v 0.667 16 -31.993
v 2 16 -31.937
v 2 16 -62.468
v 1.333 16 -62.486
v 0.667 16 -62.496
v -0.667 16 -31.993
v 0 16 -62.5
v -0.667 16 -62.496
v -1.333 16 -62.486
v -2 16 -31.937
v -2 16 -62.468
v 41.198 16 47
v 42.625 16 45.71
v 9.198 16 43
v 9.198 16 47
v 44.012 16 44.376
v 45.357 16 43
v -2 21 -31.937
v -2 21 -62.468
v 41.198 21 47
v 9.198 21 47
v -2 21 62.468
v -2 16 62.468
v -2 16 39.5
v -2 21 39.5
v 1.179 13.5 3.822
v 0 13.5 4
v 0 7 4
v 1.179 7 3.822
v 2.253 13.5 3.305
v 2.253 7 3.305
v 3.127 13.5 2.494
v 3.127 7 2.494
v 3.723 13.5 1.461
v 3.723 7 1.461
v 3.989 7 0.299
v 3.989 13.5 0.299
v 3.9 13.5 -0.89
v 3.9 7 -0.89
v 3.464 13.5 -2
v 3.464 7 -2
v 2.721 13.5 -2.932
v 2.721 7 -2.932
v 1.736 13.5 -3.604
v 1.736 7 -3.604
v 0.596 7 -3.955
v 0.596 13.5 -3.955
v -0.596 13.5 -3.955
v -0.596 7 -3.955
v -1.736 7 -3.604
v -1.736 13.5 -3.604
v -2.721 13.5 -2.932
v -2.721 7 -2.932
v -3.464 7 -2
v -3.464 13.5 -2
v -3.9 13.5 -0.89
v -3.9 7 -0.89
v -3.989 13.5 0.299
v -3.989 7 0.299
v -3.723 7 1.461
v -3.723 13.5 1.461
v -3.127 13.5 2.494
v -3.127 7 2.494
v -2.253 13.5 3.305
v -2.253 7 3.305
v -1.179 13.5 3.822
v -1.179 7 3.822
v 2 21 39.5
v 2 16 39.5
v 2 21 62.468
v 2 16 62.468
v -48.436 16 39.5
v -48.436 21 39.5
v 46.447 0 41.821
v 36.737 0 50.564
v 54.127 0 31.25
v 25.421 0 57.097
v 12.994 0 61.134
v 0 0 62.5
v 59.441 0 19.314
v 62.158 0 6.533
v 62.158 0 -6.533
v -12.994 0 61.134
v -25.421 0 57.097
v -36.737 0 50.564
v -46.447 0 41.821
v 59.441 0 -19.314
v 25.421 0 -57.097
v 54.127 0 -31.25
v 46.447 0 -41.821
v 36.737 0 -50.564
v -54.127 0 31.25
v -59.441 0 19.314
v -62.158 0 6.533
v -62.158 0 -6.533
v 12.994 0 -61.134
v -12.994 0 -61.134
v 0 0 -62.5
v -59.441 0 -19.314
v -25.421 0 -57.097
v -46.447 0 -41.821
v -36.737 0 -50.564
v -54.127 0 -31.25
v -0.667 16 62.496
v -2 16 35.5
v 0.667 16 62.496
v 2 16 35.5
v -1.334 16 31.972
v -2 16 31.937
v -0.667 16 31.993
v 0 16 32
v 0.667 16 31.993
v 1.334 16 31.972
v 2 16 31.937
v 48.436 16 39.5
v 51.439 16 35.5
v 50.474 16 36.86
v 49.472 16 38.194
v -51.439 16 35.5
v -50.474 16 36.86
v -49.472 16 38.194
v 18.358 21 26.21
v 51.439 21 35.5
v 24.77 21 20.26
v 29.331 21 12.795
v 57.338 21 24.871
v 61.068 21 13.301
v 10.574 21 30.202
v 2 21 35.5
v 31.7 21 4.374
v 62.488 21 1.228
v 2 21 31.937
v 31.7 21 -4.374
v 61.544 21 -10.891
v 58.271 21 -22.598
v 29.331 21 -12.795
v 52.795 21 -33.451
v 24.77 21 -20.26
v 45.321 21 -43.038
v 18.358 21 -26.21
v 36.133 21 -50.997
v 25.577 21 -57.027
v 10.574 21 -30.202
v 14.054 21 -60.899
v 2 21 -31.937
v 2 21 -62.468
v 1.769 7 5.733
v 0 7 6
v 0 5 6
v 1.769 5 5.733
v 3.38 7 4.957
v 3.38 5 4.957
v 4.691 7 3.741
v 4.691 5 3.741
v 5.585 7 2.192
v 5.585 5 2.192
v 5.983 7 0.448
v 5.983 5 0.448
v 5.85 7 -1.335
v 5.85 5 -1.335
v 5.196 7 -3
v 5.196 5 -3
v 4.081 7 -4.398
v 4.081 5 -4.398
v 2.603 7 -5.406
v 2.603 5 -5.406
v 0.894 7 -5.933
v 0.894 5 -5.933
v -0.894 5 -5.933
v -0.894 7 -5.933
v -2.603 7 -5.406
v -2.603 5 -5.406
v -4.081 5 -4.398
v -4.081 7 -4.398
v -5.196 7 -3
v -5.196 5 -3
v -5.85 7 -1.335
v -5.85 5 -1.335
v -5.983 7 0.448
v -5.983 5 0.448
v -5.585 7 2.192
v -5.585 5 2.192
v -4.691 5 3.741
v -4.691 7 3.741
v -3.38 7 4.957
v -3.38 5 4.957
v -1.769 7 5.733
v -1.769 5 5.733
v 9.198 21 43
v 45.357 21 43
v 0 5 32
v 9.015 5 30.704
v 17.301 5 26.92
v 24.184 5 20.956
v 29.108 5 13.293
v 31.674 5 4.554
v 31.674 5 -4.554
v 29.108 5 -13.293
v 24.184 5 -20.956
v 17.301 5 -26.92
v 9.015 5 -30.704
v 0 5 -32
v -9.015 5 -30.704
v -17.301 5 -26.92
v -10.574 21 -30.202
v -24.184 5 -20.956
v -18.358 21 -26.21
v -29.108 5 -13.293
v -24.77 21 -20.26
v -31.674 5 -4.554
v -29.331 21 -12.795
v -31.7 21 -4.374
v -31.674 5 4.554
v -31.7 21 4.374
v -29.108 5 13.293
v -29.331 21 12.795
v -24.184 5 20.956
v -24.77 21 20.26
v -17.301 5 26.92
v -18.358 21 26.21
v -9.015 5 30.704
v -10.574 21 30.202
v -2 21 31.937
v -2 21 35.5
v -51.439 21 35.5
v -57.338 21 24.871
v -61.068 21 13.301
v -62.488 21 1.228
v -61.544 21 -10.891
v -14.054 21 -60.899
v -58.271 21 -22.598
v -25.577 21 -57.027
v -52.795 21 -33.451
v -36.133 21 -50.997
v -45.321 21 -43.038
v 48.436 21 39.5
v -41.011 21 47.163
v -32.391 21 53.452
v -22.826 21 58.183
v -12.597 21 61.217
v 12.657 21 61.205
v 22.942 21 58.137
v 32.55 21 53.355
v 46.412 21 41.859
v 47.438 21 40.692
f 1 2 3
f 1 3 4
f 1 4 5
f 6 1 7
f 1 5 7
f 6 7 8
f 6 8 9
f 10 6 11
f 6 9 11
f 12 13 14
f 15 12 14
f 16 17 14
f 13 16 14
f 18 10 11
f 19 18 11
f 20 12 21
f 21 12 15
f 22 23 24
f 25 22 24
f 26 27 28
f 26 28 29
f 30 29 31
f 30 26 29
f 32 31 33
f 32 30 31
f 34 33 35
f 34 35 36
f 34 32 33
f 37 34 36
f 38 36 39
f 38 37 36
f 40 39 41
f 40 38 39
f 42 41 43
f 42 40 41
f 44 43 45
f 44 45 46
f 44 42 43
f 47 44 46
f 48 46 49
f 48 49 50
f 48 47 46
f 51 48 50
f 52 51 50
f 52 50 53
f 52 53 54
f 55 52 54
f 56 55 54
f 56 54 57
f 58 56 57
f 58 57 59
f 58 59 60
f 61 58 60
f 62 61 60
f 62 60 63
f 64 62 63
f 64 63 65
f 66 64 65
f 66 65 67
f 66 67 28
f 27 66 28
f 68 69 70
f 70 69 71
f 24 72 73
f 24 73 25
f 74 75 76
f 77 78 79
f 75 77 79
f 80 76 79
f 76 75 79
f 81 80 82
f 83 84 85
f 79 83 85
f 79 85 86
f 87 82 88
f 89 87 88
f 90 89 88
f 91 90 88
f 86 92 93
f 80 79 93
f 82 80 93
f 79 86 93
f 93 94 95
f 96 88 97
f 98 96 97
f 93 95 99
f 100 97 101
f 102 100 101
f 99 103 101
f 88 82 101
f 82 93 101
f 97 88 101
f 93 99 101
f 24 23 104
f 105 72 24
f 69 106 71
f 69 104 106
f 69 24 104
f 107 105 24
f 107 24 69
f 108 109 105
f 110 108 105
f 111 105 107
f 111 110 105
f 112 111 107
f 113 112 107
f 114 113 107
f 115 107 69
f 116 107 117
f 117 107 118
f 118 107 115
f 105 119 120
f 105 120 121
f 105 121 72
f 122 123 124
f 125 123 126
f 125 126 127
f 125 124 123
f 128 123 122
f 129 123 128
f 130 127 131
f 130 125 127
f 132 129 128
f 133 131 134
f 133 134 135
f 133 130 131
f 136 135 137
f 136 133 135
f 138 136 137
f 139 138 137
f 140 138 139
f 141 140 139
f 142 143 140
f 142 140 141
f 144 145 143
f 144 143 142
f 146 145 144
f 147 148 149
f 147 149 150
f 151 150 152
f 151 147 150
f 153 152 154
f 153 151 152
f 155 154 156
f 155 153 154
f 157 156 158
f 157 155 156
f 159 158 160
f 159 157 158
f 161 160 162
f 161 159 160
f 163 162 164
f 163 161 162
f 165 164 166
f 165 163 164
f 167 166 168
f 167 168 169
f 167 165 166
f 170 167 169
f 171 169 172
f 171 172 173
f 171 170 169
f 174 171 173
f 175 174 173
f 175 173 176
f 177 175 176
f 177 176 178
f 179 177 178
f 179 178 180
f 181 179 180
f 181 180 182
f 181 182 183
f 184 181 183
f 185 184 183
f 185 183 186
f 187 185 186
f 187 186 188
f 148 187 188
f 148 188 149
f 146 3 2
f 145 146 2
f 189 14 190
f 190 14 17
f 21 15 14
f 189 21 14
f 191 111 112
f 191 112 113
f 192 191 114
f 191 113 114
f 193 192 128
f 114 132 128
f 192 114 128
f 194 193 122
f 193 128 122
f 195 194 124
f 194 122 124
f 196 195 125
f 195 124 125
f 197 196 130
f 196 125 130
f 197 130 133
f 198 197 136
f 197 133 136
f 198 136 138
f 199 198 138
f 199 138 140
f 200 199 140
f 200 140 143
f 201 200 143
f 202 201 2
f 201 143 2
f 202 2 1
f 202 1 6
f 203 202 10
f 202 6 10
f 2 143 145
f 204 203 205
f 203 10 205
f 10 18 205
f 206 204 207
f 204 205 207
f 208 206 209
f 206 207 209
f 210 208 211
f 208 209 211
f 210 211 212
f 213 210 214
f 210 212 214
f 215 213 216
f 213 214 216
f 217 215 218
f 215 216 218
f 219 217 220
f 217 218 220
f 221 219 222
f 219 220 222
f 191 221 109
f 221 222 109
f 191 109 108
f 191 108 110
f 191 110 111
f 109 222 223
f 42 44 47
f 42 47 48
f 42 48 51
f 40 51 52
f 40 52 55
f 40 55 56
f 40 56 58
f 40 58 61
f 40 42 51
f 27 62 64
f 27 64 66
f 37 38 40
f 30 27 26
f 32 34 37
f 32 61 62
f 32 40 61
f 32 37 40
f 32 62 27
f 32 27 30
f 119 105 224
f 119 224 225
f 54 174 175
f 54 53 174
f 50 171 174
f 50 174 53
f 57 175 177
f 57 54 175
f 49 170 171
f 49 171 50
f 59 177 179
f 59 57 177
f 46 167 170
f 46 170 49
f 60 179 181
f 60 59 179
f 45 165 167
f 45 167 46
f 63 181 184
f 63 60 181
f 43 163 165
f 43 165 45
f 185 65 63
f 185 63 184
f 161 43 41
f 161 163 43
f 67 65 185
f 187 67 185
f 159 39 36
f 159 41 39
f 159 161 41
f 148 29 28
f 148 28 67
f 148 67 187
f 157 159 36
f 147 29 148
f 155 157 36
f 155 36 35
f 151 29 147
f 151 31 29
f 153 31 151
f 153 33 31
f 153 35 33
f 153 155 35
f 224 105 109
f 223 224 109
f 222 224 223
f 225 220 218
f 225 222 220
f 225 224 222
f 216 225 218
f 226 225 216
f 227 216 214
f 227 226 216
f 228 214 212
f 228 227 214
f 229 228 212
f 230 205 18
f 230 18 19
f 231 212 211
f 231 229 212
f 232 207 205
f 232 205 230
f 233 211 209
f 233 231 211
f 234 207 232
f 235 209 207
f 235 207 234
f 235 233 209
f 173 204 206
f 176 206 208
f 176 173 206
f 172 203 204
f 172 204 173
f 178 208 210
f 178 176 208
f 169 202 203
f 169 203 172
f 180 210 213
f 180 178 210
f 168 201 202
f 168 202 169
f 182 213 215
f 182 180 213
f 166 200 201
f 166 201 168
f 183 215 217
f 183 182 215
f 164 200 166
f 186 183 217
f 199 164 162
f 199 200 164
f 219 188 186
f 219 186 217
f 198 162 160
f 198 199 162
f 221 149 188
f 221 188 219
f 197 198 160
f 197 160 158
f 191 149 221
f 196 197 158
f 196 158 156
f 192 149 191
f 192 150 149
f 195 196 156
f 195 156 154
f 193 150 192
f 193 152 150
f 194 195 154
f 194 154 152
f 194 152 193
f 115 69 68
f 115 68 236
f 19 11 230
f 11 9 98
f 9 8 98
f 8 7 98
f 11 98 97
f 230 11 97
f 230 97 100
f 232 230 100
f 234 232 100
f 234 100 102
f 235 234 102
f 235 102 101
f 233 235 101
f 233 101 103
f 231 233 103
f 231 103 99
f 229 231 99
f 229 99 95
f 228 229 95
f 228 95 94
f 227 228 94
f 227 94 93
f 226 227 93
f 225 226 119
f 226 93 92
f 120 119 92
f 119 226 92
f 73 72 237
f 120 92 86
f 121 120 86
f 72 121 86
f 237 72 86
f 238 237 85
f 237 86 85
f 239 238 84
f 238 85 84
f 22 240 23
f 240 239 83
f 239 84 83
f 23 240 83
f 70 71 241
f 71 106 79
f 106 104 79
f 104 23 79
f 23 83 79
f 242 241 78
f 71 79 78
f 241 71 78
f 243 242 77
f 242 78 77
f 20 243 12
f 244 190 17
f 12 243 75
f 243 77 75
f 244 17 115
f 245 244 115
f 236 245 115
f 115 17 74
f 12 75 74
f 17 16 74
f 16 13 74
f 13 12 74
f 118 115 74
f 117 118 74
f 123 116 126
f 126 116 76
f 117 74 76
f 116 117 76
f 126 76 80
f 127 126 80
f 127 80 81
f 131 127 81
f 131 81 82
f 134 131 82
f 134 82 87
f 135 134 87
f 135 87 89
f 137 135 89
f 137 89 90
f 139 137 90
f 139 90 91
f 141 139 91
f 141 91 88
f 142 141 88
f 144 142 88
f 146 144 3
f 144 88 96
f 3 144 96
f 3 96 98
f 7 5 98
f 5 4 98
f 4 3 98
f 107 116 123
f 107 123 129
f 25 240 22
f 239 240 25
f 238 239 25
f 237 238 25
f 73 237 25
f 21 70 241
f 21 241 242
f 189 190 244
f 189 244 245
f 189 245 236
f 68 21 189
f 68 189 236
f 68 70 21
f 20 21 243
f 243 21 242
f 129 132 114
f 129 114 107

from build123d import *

# Parameters (mm, degrees)
SKETCH1_R           = 62.5
BOSS_EXTRUDE1_DEPTH = 21
SKETCH2_R           = 32
SKETCH2_R_2         = 6
CUT_EXTRUDE1_DEPTH  = 16
SKETCH3_R           = 6
SKETCH3_R_2         = 4
CUT_EXTRUDE2_DEPTH  = 14
SKETCH4_R           = 4
CUT_EXTRUDE3_DEPTH  = 7.5
CUT_EXTRUDE4_START  = -5
CUT_EXTRUDE4_DEPTH  = 5
CUT_EXTRUDE5_START  = -5
CUT_EXTRUDE5_DEPTH  = 5
CUT_EXTRUDE6_START  = -5
CUT_EXTRUDE6_DEPTH  = 5


with BuildPart() as part:
    # Sketch1 → Boss-Extrude1 (new body)
    with BuildSketch(Plane(origin=(0, 0, 0), x_dir=(1, 0, 0), z_dir=(0, 1, 0))):
        with Locations(Location((0, 0, 0), (0, 0, 90))):
            Circle(SKETCH1_R)
    extrude(amount=BOSS_EXTRUDE1_DEPTH)

    # Sketch2 → Cut-Extrude1 (cut)
    with BuildSketch(Plane(origin=(0, 21, 0), x_dir=(1, 0, 0), z_dir=(0, 1, 0))):
        with Locations(Location((0, 0, 0), (0, 0, 270))):
            Circle(SKETCH2_R)
        with Locations(Location((0, 0, 0), (0, 0, 270))):
            Circle(SKETCH2_R_2, mode=Mode.SUBTRACT)
    extrude(amount=-CUT_EXTRUDE1_DEPTH, mode=Mode.SUBTRACT)

    # Sketch3 → Cut-Extrude2 (cut)
    with BuildSketch(Plane(origin=(0, 21, 0), x_dir=(1, 0, 0), z_dir=(0, 1, 0))):
        with Locations(Location((0, 0, 0), (0, 0, 270))):
            Circle(SKETCH3_R)
        with Locations(Location((0, 0, 0), (0, 0, 270))):
            Circle(SKETCH3_R_2, mode=Mode.SUBTRACT)
    extrude(amount=-CUT_EXTRUDE2_DEPTH, mode=Mode.SUBTRACT)

    # Sketch4 → Cut-Extrude3 (cut)
    with BuildSketch(Plane(origin=(0, 21, 0), x_dir=(1, 0, 0), z_dir=(0, 1, 0))):
        with Locations(Location((0, 0, 0), (0, 0, 270))):
            Circle(SKETCH4_R)
    extrude(amount=-CUT_EXTRUDE3_DEPTH, mode=Mode.SUBTRACT)

    # Sketch5 → Cut-Extrude4 (cut)
    with BuildSketch(Plane(origin=(0, 21, 0), x_dir=(1, 0, 0), z_dir=(0, 1, 0)).offset(CUT_EXTRUDE4_START)):
        with BuildLine():
            Line((2, 62.467991804), (2, -62.467991804))
            ThreePointArc((2, -62.467991804), (0, -62.5), (-2, -62.467991804))
            Line((-2, -62.467991804), (-2, 62.467991804))
            ThreePointArc((-2, 62.467991804), (0, 62.5), (2, 62.467991804))
        make_face()
    extrude(amount=CUT_EXTRUDE4_DEPTH, mode=Mode.SUBTRACT)

    # Sketch6 → Cut-Extrude5 (cut)
    with BuildSketch(Plane(origin=(0, 21, 0), x_dir=(1, 0, 0), z_dir=(0, 1, 0)).offset(CUT_EXTRUDE5_START)):
        with BuildLine():
            Line((-48.435524153, -39.5), (48.435524153, -39.5))
            ThreePointArc((48.435524153, -39.5), (49.977438468, -37.530063205), (51.439284598, -35.5))
            Line((51.439284598, -35.5), (-51.439284598, -35.5))
            ThreePointArc((-51.439284598, -35.5), (-49.977438468, -37.530063205), (-48.435524153, -39.5))
        make_face()
    extrude(amount=CUT_EXTRUDE5_DEPTH, mode=Mode.SUBTRACT)

    # Sketch9 → Cut-Extrude6 (cut)
    with BuildSketch(Plane(origin=(0, 21, 0), x_dir=(1, 0, 0), z_dir=(0, 1, 0)).offset(CUT_EXTRUDE6_START)):
        with BuildLine():
            Line((41.19769411, -43), (45.356917885, -43))
            ThreePointArc((45.356917885, -43), (43.323494947, -45.048027544), (41.19769411, -47))
            Line((41.19769411, -47), (9.19769411, -47))
            Line((9.19769411, -47), (9.19769411, -43))
            Line((9.19769411, -43), (41.19769411, -43))
        make_face()
    extrude(amount=CUT_EXTRUDE6_DEPTH, mode=Mode.SUBTRACT)


solid = part.part
